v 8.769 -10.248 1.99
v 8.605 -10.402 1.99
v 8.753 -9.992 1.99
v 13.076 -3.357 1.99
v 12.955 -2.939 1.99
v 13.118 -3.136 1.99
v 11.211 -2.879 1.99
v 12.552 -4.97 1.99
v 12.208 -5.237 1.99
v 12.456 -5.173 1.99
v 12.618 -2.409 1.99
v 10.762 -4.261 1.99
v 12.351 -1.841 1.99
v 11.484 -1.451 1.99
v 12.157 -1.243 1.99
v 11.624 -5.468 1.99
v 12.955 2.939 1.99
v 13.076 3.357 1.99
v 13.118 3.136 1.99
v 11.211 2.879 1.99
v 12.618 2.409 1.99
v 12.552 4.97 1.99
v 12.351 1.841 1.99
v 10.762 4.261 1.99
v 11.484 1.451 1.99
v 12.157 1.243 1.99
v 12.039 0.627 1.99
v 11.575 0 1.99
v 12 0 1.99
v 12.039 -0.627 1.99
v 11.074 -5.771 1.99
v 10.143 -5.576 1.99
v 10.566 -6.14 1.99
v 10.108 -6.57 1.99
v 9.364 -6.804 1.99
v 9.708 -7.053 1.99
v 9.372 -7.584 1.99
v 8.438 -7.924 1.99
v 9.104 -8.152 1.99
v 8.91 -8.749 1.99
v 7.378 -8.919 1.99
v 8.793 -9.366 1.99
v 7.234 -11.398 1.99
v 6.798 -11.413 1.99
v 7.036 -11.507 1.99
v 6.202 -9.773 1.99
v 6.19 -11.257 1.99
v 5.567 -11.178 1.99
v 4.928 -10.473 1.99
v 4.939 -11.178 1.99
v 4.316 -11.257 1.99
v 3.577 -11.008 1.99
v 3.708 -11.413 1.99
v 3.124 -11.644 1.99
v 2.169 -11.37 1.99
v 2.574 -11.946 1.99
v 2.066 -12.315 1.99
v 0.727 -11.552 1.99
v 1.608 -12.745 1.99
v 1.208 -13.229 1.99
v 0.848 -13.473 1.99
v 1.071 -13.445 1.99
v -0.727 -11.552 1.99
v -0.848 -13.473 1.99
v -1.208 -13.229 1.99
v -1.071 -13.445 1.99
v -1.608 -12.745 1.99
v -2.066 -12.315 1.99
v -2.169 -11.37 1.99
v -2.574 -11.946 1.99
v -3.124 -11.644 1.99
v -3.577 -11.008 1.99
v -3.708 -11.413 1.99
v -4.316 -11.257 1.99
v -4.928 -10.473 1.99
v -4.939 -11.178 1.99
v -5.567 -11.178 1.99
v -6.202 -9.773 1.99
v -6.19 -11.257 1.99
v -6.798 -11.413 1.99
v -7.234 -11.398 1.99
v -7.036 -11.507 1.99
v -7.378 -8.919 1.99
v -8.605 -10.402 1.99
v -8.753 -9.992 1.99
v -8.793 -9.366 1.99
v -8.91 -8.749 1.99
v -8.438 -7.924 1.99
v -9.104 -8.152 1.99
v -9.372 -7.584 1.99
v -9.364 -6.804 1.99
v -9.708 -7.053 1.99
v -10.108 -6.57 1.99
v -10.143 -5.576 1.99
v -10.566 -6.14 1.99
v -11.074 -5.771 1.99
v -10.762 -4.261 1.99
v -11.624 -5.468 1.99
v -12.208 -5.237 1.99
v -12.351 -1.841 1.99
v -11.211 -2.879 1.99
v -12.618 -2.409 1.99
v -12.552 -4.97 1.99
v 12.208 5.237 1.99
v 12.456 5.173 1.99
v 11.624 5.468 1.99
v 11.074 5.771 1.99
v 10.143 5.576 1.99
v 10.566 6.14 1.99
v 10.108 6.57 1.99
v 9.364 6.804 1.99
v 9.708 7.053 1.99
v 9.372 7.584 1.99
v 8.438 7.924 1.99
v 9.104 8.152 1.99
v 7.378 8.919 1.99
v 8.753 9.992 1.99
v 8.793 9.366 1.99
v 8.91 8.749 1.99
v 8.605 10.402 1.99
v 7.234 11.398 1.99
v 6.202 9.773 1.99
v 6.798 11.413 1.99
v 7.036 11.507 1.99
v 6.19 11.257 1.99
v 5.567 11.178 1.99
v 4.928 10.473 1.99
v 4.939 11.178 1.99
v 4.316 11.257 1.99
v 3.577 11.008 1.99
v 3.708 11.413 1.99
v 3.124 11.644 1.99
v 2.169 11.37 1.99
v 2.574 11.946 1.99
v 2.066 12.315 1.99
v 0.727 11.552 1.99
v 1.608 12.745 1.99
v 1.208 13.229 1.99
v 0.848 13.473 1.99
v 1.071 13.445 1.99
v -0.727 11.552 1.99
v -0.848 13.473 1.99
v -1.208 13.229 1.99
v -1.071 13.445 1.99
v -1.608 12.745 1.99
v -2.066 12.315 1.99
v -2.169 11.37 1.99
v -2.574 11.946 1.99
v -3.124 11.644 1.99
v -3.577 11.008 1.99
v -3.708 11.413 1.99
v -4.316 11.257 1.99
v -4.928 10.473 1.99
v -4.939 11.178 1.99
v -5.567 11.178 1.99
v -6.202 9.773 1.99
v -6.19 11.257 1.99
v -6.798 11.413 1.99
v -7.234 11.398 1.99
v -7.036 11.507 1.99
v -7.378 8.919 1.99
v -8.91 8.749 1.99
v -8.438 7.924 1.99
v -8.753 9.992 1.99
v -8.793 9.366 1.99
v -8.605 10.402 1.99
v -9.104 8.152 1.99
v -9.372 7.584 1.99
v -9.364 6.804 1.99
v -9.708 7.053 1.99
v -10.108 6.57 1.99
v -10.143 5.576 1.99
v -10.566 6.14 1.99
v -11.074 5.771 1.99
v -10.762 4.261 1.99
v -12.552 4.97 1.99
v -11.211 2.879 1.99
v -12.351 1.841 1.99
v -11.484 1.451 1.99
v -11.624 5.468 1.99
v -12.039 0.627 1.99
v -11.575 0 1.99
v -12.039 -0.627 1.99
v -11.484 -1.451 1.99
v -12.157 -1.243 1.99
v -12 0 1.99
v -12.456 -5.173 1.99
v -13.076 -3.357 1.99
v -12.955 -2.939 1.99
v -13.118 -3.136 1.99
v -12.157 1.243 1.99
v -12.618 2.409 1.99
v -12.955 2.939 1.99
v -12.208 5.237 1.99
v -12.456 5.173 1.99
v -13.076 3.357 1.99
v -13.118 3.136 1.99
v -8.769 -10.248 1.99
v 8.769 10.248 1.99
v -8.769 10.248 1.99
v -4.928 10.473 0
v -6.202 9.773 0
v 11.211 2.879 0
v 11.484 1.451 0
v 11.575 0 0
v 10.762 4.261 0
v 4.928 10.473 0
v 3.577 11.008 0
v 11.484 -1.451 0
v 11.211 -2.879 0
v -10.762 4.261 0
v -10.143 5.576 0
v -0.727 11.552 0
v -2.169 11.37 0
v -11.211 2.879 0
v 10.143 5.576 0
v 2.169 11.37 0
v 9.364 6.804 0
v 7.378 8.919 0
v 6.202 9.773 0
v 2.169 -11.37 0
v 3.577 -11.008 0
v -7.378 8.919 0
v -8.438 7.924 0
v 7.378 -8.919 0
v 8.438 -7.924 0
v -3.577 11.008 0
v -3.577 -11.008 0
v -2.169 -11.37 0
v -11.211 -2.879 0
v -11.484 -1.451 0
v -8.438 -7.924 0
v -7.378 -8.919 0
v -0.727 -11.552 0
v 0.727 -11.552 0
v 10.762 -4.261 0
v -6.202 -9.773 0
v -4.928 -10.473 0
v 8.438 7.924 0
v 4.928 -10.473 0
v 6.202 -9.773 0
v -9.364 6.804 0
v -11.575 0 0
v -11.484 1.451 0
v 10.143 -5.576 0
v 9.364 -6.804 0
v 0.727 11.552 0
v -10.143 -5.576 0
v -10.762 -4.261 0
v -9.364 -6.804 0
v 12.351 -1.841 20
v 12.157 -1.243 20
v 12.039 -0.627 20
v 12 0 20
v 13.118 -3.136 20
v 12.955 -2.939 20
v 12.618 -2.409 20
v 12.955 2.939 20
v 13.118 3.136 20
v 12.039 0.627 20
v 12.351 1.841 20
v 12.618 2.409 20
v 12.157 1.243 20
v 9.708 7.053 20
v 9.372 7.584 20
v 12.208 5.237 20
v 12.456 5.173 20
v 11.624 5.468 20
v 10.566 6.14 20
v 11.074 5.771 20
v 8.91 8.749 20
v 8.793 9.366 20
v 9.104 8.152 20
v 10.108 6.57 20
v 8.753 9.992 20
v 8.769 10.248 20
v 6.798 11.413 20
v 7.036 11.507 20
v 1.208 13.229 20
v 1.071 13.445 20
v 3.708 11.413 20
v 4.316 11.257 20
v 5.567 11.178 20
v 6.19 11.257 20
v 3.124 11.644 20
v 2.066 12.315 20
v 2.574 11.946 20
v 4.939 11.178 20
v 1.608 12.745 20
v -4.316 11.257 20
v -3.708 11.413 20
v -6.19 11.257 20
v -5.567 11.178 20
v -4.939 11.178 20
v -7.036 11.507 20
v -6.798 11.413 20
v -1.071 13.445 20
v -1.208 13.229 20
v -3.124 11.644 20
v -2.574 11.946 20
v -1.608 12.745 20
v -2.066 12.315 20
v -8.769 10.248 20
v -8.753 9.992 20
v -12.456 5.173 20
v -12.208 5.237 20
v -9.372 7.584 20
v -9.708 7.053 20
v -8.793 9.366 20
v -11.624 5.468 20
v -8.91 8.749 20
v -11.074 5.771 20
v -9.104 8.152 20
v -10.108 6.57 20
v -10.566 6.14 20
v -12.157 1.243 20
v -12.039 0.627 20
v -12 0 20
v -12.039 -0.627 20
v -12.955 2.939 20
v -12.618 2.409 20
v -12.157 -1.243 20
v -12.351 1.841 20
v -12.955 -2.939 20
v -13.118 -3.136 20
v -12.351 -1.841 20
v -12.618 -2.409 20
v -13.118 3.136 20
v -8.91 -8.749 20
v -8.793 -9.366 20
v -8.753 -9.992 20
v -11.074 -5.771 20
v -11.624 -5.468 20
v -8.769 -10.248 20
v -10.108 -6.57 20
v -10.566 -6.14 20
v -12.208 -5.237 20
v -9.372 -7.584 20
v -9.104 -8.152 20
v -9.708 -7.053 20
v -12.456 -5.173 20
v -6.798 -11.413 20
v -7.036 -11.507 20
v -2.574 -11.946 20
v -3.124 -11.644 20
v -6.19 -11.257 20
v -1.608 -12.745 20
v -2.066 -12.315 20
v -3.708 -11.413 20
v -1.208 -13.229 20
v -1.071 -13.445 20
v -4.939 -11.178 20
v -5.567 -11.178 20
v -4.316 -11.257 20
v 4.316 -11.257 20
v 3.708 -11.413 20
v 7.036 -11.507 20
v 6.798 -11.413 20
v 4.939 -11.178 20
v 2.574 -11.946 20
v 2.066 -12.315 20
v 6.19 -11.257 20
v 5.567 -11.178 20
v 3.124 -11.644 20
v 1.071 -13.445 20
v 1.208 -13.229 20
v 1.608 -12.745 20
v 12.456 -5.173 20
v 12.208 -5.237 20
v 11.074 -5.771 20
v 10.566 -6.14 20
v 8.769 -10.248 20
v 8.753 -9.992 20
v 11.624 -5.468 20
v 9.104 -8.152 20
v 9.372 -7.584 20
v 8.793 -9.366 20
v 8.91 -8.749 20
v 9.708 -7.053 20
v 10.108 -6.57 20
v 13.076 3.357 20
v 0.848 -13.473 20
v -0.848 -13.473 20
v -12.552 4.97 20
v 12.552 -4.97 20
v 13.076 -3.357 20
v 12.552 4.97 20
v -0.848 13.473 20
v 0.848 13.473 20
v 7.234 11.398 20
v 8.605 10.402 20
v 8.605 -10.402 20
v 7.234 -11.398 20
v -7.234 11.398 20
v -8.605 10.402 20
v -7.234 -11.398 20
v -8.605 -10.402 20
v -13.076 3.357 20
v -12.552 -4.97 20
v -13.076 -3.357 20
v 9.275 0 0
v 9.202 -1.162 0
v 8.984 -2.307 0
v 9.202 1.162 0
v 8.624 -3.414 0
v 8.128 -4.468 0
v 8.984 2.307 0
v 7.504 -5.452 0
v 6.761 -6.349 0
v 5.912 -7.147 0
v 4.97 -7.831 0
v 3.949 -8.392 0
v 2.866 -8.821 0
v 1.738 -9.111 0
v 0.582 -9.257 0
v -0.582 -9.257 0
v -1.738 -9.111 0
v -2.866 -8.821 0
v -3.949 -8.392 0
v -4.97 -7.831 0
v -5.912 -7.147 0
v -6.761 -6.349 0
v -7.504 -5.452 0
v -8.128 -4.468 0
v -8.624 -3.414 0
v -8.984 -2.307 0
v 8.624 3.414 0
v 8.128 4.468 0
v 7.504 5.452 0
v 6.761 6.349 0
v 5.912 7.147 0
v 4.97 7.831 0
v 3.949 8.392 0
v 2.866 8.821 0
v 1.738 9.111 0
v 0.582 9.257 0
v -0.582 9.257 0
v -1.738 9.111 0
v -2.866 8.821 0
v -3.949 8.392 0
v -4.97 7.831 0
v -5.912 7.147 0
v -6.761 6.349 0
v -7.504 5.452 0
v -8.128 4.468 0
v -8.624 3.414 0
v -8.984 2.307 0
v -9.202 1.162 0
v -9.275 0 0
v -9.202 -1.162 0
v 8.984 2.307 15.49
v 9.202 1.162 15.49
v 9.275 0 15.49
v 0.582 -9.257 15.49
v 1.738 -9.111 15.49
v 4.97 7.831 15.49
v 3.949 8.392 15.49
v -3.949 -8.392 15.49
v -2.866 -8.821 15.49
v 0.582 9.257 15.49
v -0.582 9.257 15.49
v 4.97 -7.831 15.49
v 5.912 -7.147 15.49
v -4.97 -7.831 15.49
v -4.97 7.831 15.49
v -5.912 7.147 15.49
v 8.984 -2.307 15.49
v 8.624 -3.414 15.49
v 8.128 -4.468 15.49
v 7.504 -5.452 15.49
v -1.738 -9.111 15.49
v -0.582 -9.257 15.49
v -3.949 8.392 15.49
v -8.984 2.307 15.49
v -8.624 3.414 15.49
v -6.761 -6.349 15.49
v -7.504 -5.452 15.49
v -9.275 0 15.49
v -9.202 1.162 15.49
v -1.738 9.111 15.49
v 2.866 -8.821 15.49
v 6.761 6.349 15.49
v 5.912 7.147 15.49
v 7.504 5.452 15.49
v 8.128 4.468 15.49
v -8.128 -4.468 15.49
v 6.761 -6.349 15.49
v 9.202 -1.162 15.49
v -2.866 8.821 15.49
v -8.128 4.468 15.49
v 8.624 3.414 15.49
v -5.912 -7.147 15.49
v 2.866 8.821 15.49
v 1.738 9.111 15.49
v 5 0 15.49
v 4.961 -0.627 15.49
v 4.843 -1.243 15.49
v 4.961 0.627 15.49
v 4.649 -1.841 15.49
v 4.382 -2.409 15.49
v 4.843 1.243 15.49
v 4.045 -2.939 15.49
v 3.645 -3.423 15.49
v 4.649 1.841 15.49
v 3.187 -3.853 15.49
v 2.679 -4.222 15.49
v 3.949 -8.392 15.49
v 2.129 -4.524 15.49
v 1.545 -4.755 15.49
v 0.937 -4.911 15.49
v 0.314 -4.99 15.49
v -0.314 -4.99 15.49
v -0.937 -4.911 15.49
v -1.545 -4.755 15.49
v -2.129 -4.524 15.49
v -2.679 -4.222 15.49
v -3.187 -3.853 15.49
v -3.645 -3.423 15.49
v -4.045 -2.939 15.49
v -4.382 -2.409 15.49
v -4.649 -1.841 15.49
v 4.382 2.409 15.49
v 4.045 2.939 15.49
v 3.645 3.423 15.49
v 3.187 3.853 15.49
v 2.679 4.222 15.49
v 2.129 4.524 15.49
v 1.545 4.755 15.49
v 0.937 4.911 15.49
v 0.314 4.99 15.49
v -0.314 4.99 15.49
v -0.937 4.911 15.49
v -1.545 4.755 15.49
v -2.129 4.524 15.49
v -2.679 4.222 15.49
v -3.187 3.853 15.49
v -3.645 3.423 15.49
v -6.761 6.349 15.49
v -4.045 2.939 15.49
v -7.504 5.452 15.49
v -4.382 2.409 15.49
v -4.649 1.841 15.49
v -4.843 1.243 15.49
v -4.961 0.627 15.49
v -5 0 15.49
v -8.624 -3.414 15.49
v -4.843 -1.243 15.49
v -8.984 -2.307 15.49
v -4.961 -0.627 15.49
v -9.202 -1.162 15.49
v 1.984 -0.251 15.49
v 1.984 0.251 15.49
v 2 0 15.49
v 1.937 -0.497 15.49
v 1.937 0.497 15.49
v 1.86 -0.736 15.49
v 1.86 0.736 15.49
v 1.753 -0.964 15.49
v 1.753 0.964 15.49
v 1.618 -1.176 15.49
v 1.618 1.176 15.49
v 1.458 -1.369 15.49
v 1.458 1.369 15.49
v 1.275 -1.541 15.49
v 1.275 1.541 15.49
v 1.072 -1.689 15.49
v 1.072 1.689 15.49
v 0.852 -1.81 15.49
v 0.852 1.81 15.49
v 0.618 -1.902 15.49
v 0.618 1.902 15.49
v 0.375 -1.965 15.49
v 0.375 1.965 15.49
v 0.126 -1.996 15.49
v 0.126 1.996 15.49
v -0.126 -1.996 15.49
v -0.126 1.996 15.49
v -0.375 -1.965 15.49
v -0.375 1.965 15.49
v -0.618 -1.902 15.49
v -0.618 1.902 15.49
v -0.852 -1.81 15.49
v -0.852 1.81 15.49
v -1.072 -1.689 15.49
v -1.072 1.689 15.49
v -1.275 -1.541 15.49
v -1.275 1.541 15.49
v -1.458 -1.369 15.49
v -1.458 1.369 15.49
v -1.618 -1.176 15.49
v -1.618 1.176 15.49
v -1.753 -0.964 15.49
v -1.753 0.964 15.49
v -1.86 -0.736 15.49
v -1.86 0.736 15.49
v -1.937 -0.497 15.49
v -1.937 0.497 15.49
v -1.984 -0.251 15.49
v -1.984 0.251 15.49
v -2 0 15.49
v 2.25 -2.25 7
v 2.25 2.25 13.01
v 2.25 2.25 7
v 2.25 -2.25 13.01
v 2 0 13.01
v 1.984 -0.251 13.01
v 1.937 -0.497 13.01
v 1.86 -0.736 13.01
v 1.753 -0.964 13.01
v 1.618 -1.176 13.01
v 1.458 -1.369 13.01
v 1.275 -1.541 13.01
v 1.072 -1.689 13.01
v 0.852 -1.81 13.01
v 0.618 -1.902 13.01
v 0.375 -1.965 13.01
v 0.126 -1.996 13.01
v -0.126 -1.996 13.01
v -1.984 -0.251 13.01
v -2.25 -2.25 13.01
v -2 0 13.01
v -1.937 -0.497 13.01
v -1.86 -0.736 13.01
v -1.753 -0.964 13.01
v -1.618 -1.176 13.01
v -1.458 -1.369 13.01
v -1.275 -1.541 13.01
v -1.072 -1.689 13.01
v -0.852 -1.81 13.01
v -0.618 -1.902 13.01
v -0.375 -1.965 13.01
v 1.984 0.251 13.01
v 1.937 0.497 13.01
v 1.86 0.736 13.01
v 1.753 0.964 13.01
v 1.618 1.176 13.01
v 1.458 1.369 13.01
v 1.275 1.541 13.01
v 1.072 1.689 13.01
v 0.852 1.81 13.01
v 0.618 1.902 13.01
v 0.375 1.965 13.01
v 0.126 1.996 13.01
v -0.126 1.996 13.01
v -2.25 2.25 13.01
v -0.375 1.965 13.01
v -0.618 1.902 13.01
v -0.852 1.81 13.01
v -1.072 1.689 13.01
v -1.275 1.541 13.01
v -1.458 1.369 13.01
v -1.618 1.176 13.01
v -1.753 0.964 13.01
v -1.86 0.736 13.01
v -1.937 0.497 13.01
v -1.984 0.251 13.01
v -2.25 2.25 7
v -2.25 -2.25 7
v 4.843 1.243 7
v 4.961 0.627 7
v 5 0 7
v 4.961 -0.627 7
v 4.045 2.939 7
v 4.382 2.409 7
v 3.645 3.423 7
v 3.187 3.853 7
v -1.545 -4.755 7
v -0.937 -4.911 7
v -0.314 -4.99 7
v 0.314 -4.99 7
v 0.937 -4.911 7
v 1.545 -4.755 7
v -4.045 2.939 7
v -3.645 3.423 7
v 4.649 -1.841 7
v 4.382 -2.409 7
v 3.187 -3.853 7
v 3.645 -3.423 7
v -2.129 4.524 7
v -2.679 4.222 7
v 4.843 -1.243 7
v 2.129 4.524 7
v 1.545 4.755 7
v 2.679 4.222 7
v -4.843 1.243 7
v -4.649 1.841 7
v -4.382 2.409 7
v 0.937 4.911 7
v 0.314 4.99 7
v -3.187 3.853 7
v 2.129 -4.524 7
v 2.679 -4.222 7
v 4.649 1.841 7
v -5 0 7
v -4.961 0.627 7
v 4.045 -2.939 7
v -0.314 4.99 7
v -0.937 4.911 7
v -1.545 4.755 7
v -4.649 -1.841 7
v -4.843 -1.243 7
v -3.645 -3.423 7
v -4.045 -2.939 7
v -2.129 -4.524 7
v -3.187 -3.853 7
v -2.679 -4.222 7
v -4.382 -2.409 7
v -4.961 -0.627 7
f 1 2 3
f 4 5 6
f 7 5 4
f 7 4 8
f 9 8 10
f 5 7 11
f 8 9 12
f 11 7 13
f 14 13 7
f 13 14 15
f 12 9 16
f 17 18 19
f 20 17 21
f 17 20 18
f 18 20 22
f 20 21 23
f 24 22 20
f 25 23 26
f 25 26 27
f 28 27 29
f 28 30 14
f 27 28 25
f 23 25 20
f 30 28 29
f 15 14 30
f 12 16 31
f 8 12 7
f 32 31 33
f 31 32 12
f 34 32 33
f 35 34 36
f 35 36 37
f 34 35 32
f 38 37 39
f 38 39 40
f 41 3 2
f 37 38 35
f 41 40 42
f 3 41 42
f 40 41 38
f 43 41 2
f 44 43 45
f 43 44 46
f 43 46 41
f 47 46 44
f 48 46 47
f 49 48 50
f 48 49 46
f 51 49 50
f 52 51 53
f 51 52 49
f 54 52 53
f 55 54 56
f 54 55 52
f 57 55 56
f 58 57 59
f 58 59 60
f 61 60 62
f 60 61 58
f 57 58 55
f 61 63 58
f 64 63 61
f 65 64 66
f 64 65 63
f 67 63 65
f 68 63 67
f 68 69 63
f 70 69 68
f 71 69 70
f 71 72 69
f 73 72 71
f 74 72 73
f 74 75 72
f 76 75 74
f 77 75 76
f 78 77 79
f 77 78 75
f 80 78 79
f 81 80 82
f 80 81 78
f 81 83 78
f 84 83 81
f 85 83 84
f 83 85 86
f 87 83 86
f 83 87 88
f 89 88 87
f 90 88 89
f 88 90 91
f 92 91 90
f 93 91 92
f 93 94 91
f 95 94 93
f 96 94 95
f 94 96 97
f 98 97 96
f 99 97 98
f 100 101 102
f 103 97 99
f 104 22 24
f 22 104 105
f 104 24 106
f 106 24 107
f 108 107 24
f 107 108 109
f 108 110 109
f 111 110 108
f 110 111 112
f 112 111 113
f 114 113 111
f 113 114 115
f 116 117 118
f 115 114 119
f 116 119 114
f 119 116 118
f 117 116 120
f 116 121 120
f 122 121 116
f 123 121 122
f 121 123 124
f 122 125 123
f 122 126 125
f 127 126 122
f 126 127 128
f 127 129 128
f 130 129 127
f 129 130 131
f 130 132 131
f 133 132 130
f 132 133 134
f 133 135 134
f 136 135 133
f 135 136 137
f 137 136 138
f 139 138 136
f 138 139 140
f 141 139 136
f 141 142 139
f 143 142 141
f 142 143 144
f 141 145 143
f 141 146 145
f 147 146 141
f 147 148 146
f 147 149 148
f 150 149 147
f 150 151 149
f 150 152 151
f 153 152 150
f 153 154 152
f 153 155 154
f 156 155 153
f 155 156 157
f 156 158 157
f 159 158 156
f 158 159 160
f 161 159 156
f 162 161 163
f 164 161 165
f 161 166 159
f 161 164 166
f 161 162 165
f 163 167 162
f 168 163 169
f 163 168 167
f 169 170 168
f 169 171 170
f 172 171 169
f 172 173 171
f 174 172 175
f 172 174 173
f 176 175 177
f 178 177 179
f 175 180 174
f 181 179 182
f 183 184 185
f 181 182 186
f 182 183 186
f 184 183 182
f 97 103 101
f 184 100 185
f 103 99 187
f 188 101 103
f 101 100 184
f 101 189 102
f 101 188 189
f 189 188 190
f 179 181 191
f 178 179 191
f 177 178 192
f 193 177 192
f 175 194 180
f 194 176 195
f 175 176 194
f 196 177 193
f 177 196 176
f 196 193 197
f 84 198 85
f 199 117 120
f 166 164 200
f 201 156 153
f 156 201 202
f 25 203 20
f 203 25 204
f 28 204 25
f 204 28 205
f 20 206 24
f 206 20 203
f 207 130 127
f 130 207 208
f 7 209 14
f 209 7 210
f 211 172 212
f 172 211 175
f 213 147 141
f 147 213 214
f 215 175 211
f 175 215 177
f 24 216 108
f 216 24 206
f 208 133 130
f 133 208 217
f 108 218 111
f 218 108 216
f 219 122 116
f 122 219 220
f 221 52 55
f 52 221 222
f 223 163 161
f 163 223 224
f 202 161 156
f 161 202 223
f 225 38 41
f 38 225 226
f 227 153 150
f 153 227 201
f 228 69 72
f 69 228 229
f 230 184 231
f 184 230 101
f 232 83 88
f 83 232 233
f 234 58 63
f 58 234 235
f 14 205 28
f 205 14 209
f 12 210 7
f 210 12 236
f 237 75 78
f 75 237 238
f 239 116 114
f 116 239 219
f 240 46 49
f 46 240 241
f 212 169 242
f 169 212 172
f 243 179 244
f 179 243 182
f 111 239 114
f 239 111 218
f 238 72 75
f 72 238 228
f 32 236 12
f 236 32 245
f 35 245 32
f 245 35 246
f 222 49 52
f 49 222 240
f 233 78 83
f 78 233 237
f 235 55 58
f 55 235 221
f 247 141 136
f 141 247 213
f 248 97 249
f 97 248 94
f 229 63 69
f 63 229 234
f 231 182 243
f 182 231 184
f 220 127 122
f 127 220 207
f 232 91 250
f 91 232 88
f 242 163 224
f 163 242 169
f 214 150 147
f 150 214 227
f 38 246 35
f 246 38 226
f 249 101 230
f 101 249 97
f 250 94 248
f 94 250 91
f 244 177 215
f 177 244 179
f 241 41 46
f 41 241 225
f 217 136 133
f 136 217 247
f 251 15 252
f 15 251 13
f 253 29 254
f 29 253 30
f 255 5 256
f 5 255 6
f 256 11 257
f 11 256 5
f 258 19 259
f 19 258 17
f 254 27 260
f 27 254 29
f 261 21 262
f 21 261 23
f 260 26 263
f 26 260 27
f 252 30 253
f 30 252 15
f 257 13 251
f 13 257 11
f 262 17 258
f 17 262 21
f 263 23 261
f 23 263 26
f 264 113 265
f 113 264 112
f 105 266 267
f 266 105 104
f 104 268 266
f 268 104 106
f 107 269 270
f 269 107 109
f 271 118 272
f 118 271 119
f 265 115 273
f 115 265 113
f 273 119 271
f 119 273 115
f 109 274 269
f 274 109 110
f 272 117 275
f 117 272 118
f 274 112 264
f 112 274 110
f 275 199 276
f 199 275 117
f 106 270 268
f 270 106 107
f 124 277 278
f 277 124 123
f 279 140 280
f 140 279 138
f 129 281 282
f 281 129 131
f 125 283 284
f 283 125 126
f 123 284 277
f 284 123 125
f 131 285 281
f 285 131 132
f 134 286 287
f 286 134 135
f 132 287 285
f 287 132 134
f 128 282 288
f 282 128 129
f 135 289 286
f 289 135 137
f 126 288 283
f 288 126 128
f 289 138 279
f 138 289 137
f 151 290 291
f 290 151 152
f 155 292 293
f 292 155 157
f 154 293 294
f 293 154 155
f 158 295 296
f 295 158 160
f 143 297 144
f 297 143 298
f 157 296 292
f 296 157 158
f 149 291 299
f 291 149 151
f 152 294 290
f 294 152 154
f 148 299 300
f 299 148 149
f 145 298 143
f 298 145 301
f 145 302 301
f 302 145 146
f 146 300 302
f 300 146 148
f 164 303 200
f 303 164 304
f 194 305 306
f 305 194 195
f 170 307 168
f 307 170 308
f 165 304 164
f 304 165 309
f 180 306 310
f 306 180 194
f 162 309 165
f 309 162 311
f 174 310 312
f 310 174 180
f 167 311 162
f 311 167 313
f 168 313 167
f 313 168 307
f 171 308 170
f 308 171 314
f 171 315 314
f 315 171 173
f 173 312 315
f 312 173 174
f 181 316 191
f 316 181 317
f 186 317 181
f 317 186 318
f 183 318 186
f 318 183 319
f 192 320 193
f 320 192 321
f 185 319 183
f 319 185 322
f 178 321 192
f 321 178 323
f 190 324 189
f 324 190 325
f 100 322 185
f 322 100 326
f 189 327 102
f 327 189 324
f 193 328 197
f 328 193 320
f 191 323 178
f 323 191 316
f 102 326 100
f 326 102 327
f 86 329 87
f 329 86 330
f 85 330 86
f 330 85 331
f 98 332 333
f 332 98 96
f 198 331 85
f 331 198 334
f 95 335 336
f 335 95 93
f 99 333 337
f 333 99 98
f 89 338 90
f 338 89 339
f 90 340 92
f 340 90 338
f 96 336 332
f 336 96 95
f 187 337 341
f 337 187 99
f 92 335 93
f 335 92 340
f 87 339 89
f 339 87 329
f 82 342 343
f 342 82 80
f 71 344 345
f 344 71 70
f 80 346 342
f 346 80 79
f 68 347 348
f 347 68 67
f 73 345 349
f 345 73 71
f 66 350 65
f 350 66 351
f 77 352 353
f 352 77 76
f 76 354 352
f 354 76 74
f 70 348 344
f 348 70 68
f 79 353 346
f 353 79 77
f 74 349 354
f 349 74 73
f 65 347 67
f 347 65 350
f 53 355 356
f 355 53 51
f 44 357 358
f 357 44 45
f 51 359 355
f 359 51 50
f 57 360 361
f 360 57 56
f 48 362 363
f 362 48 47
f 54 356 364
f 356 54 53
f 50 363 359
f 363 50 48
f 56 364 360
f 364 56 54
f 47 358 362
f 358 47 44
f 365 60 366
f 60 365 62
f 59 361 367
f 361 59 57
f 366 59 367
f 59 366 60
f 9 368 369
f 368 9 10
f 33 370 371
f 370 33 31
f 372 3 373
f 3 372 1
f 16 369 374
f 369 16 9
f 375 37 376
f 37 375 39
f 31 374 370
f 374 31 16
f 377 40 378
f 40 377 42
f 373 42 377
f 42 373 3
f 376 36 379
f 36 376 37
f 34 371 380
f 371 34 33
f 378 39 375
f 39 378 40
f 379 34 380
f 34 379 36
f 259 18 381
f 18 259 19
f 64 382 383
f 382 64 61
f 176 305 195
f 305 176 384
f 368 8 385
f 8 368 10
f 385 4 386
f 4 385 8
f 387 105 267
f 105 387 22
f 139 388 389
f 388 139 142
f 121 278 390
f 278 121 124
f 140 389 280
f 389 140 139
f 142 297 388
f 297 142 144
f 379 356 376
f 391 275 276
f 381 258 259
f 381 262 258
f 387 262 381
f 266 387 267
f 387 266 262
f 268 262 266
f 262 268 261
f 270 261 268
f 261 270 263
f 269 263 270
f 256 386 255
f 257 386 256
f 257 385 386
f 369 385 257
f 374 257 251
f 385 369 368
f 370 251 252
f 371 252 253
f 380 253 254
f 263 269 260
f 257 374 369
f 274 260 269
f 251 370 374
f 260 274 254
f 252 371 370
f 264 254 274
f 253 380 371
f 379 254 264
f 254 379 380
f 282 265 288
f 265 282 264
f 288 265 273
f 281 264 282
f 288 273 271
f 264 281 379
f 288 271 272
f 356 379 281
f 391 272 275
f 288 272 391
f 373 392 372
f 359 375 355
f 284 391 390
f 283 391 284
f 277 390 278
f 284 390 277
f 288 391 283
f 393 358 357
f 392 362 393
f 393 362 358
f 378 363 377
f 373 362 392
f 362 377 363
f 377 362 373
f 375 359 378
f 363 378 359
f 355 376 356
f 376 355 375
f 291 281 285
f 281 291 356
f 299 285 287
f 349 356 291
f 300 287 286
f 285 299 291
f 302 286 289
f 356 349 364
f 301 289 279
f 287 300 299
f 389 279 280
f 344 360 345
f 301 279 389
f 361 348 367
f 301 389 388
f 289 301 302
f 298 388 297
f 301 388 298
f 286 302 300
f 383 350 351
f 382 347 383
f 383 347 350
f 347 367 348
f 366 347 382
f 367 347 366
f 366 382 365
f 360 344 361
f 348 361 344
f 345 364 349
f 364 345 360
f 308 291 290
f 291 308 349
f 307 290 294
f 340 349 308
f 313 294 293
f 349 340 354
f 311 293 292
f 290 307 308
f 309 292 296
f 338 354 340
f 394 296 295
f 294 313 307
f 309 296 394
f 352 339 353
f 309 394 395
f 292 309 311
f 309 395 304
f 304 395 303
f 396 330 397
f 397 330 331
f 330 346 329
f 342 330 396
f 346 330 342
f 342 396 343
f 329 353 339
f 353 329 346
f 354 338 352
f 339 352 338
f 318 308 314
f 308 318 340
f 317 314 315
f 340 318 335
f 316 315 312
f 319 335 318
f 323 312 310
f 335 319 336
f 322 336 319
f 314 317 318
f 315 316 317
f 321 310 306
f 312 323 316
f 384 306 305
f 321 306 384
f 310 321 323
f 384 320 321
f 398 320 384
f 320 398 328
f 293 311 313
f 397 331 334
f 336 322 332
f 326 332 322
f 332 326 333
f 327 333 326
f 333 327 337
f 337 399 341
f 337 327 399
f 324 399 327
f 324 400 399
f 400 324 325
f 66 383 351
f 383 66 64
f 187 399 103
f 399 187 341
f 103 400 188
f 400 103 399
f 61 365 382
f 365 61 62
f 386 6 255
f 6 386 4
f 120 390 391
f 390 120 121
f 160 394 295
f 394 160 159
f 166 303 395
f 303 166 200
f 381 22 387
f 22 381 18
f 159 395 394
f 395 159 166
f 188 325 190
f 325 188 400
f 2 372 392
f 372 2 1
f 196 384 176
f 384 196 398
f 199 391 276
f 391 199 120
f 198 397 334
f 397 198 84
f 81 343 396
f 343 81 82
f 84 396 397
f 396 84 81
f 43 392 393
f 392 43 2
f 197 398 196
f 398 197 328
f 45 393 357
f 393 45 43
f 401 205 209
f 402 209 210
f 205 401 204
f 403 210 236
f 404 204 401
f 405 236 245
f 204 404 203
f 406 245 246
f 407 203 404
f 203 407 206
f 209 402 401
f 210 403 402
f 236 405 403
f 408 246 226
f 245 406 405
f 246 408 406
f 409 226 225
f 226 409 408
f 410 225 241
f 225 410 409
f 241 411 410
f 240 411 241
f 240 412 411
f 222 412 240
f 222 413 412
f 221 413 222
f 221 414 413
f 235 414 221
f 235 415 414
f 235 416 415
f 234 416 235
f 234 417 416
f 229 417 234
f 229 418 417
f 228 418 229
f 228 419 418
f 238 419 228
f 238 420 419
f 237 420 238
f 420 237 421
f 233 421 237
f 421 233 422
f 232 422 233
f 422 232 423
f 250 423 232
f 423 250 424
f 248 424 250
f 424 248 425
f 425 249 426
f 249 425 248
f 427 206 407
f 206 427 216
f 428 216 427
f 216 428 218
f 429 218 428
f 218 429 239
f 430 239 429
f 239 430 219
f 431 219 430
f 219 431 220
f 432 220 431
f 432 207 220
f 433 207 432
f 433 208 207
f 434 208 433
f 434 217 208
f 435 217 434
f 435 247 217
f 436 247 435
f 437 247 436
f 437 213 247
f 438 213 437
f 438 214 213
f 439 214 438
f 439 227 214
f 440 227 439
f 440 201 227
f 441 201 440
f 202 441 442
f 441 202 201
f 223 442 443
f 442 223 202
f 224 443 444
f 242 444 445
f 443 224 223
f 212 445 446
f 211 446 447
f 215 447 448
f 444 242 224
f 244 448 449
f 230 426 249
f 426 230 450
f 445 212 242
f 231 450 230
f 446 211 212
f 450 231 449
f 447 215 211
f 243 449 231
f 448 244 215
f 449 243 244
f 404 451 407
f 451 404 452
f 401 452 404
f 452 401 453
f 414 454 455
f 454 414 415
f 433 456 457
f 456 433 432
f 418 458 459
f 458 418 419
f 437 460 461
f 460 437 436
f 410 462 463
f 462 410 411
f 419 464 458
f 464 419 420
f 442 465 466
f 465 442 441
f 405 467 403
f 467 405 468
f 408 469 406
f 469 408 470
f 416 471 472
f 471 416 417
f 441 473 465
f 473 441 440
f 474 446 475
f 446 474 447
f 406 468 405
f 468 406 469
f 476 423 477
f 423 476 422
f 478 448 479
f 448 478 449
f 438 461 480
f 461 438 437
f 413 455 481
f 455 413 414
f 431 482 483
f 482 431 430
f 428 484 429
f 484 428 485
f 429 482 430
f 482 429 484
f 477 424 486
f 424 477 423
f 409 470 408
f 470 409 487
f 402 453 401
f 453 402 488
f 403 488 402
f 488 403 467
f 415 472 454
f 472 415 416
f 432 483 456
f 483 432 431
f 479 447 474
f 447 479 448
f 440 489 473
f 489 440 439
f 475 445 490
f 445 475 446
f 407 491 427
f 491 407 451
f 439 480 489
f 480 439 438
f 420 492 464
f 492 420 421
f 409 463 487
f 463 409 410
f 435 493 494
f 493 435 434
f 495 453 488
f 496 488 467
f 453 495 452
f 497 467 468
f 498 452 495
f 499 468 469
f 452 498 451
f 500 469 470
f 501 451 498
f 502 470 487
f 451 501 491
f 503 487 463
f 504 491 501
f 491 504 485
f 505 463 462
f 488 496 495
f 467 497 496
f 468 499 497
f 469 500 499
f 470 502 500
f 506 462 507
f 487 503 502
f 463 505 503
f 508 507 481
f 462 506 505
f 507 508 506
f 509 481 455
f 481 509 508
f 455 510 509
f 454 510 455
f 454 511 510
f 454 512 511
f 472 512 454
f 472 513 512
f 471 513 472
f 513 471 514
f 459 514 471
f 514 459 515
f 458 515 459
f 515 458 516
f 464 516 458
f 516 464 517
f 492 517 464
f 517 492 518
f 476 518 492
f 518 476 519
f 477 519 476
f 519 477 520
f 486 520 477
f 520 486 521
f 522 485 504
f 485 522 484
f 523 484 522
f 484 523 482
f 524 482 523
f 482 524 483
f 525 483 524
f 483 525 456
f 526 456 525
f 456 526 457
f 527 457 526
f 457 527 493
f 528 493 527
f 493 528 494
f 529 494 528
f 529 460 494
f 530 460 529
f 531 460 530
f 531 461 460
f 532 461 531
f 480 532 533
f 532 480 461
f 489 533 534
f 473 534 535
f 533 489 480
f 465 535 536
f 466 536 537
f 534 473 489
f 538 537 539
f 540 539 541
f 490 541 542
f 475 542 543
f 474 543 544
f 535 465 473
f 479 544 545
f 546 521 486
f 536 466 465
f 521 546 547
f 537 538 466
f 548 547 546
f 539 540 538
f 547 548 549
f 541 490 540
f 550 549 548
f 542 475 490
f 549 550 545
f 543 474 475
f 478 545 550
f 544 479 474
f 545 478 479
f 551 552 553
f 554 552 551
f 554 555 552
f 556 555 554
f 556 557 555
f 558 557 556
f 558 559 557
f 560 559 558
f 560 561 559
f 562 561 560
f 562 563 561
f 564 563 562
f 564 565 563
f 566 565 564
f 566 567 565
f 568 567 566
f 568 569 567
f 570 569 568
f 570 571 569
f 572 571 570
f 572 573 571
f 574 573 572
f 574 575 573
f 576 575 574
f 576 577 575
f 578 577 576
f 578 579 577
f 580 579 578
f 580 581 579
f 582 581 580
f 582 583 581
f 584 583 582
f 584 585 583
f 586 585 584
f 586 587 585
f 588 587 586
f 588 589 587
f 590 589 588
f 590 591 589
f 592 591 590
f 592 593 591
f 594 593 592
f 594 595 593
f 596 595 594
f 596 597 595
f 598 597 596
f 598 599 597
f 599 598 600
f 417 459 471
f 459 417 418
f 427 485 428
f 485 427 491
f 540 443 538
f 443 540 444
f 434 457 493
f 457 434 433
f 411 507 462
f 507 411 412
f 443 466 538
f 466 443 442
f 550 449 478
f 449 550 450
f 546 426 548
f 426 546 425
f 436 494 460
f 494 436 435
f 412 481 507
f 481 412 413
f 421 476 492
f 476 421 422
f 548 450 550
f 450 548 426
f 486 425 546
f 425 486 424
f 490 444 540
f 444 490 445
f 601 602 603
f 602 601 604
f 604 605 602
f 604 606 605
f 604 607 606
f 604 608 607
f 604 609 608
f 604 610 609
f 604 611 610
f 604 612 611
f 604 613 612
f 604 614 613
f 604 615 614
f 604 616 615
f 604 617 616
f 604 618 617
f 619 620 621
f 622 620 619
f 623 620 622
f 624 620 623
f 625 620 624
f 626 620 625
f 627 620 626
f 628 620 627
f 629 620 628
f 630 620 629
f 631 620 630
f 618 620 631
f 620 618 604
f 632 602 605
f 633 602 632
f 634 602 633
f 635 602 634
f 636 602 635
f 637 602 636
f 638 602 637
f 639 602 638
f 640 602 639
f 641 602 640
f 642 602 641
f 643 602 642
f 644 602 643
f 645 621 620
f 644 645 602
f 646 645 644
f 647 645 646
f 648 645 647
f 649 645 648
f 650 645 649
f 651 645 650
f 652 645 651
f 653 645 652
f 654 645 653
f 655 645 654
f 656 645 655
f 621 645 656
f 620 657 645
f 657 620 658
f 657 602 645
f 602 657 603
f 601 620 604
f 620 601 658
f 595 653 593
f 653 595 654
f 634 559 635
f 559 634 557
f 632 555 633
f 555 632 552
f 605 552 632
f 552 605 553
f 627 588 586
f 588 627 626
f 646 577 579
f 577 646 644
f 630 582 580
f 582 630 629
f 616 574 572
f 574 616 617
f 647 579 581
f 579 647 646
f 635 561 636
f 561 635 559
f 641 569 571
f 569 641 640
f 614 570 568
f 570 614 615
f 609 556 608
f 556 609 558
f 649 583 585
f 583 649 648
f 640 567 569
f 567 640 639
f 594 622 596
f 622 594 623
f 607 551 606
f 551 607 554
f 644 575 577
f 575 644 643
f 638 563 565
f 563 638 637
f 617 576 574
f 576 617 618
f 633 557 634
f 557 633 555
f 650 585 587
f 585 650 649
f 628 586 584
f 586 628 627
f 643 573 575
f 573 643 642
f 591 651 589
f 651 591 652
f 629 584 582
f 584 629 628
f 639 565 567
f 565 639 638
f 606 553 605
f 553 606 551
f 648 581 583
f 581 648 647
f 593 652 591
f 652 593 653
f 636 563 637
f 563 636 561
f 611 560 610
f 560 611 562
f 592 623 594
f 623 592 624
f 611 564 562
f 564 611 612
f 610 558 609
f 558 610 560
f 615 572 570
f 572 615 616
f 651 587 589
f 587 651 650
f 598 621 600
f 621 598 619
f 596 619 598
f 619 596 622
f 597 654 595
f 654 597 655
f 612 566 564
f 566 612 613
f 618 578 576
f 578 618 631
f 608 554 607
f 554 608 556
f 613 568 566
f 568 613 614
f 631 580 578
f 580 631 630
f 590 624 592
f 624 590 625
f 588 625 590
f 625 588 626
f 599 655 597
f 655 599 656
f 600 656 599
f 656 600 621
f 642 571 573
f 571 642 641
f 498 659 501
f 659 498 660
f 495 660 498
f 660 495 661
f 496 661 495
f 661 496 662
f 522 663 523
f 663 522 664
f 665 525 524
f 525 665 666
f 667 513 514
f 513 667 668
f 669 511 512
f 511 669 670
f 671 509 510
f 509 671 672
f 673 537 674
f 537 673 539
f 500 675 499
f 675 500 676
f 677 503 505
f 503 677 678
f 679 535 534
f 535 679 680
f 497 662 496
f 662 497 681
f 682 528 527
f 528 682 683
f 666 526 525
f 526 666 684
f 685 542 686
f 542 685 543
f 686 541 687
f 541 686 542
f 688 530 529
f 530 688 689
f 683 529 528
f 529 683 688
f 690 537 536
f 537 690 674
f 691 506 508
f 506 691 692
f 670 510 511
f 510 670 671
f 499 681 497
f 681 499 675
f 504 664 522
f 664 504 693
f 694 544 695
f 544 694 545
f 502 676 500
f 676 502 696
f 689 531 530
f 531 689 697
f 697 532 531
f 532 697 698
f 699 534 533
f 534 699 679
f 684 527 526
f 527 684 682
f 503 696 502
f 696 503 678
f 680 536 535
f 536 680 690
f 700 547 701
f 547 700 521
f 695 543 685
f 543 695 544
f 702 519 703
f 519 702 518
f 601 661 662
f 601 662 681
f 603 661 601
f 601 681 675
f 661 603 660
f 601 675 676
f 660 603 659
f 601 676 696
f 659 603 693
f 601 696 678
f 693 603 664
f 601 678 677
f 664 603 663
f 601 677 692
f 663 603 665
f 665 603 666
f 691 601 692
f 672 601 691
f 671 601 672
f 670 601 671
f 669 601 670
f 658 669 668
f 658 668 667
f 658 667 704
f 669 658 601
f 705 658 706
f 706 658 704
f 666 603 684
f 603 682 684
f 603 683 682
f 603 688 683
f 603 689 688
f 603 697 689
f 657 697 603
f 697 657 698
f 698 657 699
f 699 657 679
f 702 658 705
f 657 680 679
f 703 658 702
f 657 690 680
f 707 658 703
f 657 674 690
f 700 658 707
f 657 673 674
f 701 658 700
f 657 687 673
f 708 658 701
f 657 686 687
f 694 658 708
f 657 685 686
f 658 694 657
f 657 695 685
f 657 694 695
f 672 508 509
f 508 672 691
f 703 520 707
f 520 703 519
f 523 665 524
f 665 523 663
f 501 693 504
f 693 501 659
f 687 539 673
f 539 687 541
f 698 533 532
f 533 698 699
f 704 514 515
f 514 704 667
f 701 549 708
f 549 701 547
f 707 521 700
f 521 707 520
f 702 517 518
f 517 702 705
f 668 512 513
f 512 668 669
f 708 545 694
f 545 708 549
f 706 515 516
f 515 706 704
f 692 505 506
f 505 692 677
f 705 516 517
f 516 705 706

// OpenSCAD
$fn = 50;
difference() {
    cylinder(20, d=27, true);
    translate([0, 0, -0.01]) {
        cylinder(15.5, d=18.55, true);
    }
    translate([0,0,-0.01]) {
        difference() {
            cylinder(2, d=27.01, true);
            translate([0, 0, -0.01]) {
                cylinder(2.1, d=23.15, true);
            }
        }
    }
    //translate([0, 0, 58]) {
    //    sphere(40);
    //}
    
    for (i = [0:10])
    {
        translate([17 * cos(i * 36), 17 * sin(i * 36), 0]){
            cylinder(20.01, d=10, true);
        }
    }
    
    // translate([0, 0, 19]) {
    //    difference() {
    //        cylinder(5, d1=30, d2=20, true);
    //        cylinder(5, d1=28, d2=19, true);
    //    }
    //}

}

translate([0, 0, 7]) {
    difference() {
        cylinder(12, d=10, true);
        union() {
            translate([-2.25, -2.25, -0.01]) {
                cube([4.5, 4.5, 6.02], false);
            }
            translate([0, 0, 6]) {
                cylinder(4, d=4, true);
            }
        }
    }
}
